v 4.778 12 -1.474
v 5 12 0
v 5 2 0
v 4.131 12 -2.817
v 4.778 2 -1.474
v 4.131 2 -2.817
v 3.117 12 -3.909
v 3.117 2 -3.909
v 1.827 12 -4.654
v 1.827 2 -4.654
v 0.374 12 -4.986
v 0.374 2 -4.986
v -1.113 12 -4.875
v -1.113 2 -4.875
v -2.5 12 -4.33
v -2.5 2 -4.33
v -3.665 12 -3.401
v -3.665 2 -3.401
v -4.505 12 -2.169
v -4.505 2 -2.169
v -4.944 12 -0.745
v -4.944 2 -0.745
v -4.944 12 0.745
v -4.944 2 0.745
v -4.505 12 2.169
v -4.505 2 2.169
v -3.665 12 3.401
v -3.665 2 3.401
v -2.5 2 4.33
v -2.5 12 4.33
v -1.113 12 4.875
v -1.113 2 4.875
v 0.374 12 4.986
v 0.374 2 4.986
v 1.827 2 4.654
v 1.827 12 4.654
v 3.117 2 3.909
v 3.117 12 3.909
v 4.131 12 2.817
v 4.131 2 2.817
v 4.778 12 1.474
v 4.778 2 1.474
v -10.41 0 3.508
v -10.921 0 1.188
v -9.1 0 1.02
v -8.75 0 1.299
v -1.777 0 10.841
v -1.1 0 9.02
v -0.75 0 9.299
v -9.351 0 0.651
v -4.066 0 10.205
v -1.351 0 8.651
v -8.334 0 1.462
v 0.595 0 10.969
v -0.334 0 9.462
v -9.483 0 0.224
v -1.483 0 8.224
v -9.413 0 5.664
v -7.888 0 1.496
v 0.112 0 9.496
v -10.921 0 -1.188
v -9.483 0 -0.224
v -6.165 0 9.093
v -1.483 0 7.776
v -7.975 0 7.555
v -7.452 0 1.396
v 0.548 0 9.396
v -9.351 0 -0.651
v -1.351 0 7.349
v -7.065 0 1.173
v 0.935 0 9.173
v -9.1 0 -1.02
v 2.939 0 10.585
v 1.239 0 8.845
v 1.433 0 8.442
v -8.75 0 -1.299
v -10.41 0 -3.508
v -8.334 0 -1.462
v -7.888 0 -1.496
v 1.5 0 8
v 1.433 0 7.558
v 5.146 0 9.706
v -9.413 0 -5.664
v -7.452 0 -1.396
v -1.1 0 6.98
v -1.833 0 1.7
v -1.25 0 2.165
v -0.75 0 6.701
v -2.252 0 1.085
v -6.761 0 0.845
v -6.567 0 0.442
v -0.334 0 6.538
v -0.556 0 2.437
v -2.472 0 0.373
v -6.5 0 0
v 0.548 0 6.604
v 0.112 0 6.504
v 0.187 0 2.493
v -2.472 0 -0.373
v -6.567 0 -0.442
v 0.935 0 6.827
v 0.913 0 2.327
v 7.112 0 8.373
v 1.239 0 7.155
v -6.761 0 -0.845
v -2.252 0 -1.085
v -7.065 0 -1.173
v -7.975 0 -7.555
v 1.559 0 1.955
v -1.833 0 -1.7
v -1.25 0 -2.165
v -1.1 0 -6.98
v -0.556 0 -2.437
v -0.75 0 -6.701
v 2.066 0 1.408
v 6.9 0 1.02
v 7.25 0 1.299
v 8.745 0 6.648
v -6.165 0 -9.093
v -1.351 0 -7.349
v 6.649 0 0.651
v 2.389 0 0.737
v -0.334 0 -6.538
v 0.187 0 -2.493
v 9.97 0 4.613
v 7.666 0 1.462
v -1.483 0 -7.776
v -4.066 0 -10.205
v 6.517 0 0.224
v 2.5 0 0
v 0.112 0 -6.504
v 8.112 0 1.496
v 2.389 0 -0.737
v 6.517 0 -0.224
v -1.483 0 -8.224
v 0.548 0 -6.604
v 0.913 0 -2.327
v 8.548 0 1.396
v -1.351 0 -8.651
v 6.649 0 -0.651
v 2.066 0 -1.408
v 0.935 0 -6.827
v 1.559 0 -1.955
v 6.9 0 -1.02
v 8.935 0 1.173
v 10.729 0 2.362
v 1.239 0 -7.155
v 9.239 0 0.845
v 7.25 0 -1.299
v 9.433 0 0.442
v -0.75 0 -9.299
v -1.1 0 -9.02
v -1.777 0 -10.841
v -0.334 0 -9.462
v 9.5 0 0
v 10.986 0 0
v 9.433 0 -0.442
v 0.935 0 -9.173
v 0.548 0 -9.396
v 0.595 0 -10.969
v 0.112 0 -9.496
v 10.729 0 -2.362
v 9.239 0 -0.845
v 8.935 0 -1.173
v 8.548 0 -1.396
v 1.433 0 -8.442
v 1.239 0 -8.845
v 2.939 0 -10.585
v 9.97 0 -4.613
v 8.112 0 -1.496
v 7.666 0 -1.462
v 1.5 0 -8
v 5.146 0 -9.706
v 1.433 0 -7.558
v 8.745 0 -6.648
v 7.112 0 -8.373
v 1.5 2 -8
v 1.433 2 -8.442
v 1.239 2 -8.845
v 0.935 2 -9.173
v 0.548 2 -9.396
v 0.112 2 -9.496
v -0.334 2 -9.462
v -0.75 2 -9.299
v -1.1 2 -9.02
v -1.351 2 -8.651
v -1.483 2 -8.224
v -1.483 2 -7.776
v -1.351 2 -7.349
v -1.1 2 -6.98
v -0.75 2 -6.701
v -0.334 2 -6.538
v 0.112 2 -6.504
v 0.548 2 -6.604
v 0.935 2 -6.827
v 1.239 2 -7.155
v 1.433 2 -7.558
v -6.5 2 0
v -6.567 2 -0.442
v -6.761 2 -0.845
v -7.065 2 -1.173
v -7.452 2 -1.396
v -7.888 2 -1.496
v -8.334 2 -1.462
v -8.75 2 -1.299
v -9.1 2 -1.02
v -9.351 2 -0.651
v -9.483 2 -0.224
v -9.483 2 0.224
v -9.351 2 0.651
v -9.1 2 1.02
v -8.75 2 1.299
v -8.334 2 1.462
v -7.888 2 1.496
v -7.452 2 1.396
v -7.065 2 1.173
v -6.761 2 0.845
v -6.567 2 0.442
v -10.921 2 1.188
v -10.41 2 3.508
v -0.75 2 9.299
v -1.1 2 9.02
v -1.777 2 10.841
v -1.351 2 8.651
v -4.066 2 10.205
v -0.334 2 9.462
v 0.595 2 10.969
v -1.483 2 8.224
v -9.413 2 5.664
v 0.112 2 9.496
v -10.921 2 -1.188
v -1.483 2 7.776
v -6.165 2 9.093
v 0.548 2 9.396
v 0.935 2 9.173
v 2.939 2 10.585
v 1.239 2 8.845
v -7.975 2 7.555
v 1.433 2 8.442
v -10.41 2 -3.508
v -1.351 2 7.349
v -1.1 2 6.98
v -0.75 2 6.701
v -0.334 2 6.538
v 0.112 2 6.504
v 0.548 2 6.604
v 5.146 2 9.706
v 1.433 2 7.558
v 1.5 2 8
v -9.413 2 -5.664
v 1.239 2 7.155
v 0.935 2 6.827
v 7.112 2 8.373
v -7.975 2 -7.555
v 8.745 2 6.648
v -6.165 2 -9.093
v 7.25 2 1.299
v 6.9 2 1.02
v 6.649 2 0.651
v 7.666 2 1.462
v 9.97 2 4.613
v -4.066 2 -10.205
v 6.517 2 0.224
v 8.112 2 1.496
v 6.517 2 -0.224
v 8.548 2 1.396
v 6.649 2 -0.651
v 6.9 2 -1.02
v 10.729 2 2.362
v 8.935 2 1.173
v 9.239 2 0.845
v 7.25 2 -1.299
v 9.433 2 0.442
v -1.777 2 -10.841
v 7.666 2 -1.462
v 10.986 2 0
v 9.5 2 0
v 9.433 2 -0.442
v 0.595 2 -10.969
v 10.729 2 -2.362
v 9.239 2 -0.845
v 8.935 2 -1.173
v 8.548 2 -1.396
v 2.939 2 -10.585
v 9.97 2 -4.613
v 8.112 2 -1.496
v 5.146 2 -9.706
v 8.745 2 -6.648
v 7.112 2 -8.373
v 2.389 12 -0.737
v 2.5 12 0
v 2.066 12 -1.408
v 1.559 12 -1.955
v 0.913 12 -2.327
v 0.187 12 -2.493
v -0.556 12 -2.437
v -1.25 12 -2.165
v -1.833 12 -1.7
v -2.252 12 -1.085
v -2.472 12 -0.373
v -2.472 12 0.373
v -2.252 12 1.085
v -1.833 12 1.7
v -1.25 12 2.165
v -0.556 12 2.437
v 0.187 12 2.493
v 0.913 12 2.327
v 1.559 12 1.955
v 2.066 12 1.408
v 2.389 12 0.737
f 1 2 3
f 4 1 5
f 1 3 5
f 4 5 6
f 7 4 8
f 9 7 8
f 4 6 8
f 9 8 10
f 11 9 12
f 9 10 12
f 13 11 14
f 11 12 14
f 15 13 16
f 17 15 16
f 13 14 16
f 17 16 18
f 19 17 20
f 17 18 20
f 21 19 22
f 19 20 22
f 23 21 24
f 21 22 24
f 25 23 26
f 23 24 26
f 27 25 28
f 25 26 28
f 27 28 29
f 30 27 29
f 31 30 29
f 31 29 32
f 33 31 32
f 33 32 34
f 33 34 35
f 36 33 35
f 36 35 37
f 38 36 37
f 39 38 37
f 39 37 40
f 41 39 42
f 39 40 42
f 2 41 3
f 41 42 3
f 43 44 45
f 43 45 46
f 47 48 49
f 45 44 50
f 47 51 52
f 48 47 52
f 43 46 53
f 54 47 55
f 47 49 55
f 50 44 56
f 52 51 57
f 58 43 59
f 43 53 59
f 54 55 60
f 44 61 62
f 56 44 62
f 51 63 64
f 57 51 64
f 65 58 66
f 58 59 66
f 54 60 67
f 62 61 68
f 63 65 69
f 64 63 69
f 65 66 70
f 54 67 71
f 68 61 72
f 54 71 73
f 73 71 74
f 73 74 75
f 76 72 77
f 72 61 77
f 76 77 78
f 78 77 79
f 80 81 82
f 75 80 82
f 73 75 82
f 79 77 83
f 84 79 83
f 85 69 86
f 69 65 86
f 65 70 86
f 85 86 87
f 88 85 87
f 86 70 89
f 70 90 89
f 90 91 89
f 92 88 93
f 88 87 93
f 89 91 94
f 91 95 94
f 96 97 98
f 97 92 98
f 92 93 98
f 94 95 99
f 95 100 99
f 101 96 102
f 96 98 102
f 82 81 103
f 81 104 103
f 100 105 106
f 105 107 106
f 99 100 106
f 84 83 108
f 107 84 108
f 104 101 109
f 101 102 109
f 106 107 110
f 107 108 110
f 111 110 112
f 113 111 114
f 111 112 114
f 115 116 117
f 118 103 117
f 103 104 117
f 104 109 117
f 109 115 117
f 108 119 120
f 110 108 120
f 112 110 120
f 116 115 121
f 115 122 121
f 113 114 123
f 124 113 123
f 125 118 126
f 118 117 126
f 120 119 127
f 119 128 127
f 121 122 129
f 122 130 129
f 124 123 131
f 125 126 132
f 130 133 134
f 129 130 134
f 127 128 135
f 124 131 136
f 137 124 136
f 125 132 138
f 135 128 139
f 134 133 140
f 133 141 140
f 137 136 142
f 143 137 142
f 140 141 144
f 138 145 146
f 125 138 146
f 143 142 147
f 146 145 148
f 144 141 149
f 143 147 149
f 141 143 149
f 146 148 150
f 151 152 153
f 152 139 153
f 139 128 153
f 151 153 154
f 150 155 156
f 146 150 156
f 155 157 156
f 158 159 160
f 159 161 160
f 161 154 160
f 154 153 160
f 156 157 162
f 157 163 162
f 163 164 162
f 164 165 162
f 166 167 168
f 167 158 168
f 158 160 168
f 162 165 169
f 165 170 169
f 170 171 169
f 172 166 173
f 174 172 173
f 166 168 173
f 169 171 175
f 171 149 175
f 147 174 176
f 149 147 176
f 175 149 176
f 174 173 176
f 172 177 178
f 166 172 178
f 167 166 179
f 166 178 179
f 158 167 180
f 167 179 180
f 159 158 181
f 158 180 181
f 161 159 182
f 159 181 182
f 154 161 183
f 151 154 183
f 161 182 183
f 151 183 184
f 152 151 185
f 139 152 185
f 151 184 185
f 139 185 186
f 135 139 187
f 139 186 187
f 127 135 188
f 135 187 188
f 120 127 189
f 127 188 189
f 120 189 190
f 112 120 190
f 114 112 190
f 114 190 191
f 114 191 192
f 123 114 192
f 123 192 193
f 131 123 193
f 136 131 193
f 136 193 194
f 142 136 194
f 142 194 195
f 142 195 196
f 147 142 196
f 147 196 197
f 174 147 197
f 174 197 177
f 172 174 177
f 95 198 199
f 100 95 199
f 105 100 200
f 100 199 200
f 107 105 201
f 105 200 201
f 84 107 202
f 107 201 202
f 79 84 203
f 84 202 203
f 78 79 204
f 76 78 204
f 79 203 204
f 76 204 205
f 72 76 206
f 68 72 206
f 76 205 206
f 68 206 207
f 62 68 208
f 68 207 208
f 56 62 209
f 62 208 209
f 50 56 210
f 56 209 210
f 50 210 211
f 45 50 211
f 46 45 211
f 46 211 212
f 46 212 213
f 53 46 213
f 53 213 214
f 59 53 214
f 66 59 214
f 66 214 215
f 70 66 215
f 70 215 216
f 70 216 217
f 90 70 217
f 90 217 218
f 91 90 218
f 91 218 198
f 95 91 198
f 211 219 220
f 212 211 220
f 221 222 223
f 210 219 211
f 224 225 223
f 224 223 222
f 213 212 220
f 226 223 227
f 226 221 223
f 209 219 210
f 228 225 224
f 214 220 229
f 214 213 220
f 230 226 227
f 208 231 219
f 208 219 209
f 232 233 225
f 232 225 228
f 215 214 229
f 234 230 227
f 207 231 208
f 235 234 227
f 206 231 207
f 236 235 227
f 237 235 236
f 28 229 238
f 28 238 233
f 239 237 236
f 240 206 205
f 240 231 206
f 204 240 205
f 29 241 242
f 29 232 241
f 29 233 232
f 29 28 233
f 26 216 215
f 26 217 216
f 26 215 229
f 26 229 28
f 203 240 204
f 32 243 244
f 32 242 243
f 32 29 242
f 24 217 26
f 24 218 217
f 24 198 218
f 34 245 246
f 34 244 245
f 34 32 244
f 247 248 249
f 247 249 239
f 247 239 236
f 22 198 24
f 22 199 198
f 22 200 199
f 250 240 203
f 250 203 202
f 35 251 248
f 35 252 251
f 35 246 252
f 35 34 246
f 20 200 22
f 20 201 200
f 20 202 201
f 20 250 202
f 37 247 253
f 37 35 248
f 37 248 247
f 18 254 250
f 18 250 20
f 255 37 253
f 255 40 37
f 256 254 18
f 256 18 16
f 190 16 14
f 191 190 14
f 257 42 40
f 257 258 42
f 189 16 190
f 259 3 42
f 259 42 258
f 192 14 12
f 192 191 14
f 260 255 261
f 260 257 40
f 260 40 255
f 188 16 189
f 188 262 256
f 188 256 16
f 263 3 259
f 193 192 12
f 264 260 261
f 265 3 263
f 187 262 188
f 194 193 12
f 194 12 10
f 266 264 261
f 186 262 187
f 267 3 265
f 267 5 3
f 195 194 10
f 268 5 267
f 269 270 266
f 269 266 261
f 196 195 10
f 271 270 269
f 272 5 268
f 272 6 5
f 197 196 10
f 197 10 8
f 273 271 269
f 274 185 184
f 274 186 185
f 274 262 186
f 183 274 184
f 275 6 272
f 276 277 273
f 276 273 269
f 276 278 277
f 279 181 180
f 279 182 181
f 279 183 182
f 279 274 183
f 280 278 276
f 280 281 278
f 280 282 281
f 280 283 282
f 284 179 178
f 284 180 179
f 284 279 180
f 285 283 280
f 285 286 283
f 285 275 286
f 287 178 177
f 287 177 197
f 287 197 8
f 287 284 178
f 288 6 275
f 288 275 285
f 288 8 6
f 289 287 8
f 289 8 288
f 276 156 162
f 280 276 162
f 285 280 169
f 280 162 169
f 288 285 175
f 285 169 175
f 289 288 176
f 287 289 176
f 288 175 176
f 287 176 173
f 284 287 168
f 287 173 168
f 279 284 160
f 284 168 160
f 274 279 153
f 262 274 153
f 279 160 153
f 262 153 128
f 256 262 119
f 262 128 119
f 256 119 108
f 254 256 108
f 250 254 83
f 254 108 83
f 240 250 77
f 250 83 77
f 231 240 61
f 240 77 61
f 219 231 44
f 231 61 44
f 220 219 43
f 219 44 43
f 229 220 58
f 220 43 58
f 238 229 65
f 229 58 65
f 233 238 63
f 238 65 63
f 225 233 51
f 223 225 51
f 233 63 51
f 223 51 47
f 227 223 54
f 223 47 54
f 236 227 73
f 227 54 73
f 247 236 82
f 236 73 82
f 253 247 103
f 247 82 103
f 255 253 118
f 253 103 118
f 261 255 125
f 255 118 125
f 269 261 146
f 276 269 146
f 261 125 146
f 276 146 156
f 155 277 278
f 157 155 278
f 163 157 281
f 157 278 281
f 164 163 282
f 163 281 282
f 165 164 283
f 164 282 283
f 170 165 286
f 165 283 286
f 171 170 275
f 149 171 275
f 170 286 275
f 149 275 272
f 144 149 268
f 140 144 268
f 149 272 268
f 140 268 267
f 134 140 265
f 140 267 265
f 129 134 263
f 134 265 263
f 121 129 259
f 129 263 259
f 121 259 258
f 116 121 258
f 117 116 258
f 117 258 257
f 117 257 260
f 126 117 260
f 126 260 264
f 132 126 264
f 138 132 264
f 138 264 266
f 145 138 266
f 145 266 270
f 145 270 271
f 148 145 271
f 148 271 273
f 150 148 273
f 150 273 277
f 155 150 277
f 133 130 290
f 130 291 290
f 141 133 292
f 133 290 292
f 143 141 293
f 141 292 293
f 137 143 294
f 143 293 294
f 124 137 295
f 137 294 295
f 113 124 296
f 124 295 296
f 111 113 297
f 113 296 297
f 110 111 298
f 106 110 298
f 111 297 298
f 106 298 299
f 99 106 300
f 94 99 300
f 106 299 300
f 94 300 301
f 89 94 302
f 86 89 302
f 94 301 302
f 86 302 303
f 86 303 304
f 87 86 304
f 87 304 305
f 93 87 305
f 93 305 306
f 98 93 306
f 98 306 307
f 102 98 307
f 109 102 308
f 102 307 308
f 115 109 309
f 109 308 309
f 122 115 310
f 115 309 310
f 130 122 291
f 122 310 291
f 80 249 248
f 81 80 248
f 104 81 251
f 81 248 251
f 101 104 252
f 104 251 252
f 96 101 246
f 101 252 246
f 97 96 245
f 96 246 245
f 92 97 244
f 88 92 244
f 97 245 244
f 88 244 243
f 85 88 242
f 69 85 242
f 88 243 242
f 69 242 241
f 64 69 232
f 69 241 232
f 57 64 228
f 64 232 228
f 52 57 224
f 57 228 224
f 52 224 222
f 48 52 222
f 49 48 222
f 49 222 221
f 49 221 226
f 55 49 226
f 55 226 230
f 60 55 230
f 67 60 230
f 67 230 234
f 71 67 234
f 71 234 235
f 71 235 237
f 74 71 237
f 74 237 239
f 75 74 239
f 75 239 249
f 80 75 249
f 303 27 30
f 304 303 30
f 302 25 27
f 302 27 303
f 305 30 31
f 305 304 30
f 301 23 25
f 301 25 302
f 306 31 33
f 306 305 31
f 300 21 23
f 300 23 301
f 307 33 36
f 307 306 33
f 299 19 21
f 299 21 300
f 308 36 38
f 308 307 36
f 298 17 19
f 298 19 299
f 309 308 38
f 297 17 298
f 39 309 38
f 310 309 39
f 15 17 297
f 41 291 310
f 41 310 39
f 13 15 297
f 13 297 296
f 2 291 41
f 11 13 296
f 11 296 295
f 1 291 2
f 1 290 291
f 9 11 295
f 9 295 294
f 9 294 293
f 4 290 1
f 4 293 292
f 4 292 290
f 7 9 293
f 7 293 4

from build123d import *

# Parameters (mm, degrees)
SKETCH1_R               = 10.9855
BOSS_EXTRUDE1_DEPTH     = 2
SKETCH3_R               = 5
BOSS_EXTRUDE2_DEPTH     = 10
SKETCH2_R               = 2.5
CUT_EXTRUDE1_DEPTH      = 11
CUT_EXTRUDE1_DEPTH_BACK = 3
SKETCH4_R               = 1.5
CUT_EXTRUDE2_DEPTH      = 10


with BuildPart() as part:
    # Sketch1 → Boss-Extrude1 (new body)
    with BuildSketch(Plane(origin=(0, 0, 0), x_dir=(1, 0, 0), z_dir=(0, 1, 0))):
        Circle(SKETCH1_R)
    extrude(amount=BOSS_EXTRUDE1_DEPTH)

    # Sketch3 → Boss-Extrude2 (add)
    with BuildSketch(Plane(origin=(0, 2, 0), x_dir=(1, 0, 0), z_dir=(0, 1, 0))):
        Circle(SKETCH3_R)
    extrude(amount=BOSS_EXTRUDE2_DEPTH)

    # Sketch2 → Cut-Extrude1 (cut, two sides)
    with BuildSketch(Plane(origin=(0, 2, 0), x_dir=(1, 0, 0), z_dir=(0, 1, 0))) as cut_extrude1_sk:
        Circle(SKETCH2_R)
    extrude(amount=CUT_EXTRUDE1_DEPTH, mode=Mode.SUBTRACT)
    extrude(cut_extrude1_sk.sketch, amount=-CUT_EXTRUDE1_DEPTH_BACK, mode=Mode.SUBTRACT)

    # Sketch4 → Cut-Extrude2 (cut)
    with BuildSketch(Plane(origin=(0, 2, 0), x_dir=(1, 0, 0), z_dir=(0, 1, 0))):
        with Locations((8, 0)):
            Circle(SKETCH4_R)
        with Locations((0, -8)):
            Circle(SKETCH4_R)
        with Locations((-8, 0)):
            Circle(SKETCH4_R)
        with Locations((0, 8)):
            Circle(SKETCH4_R)
    extrude(amount=-CUT_EXTRUDE2_DEPTH, mode=Mode.SUBTRACT)


solid = part.part
